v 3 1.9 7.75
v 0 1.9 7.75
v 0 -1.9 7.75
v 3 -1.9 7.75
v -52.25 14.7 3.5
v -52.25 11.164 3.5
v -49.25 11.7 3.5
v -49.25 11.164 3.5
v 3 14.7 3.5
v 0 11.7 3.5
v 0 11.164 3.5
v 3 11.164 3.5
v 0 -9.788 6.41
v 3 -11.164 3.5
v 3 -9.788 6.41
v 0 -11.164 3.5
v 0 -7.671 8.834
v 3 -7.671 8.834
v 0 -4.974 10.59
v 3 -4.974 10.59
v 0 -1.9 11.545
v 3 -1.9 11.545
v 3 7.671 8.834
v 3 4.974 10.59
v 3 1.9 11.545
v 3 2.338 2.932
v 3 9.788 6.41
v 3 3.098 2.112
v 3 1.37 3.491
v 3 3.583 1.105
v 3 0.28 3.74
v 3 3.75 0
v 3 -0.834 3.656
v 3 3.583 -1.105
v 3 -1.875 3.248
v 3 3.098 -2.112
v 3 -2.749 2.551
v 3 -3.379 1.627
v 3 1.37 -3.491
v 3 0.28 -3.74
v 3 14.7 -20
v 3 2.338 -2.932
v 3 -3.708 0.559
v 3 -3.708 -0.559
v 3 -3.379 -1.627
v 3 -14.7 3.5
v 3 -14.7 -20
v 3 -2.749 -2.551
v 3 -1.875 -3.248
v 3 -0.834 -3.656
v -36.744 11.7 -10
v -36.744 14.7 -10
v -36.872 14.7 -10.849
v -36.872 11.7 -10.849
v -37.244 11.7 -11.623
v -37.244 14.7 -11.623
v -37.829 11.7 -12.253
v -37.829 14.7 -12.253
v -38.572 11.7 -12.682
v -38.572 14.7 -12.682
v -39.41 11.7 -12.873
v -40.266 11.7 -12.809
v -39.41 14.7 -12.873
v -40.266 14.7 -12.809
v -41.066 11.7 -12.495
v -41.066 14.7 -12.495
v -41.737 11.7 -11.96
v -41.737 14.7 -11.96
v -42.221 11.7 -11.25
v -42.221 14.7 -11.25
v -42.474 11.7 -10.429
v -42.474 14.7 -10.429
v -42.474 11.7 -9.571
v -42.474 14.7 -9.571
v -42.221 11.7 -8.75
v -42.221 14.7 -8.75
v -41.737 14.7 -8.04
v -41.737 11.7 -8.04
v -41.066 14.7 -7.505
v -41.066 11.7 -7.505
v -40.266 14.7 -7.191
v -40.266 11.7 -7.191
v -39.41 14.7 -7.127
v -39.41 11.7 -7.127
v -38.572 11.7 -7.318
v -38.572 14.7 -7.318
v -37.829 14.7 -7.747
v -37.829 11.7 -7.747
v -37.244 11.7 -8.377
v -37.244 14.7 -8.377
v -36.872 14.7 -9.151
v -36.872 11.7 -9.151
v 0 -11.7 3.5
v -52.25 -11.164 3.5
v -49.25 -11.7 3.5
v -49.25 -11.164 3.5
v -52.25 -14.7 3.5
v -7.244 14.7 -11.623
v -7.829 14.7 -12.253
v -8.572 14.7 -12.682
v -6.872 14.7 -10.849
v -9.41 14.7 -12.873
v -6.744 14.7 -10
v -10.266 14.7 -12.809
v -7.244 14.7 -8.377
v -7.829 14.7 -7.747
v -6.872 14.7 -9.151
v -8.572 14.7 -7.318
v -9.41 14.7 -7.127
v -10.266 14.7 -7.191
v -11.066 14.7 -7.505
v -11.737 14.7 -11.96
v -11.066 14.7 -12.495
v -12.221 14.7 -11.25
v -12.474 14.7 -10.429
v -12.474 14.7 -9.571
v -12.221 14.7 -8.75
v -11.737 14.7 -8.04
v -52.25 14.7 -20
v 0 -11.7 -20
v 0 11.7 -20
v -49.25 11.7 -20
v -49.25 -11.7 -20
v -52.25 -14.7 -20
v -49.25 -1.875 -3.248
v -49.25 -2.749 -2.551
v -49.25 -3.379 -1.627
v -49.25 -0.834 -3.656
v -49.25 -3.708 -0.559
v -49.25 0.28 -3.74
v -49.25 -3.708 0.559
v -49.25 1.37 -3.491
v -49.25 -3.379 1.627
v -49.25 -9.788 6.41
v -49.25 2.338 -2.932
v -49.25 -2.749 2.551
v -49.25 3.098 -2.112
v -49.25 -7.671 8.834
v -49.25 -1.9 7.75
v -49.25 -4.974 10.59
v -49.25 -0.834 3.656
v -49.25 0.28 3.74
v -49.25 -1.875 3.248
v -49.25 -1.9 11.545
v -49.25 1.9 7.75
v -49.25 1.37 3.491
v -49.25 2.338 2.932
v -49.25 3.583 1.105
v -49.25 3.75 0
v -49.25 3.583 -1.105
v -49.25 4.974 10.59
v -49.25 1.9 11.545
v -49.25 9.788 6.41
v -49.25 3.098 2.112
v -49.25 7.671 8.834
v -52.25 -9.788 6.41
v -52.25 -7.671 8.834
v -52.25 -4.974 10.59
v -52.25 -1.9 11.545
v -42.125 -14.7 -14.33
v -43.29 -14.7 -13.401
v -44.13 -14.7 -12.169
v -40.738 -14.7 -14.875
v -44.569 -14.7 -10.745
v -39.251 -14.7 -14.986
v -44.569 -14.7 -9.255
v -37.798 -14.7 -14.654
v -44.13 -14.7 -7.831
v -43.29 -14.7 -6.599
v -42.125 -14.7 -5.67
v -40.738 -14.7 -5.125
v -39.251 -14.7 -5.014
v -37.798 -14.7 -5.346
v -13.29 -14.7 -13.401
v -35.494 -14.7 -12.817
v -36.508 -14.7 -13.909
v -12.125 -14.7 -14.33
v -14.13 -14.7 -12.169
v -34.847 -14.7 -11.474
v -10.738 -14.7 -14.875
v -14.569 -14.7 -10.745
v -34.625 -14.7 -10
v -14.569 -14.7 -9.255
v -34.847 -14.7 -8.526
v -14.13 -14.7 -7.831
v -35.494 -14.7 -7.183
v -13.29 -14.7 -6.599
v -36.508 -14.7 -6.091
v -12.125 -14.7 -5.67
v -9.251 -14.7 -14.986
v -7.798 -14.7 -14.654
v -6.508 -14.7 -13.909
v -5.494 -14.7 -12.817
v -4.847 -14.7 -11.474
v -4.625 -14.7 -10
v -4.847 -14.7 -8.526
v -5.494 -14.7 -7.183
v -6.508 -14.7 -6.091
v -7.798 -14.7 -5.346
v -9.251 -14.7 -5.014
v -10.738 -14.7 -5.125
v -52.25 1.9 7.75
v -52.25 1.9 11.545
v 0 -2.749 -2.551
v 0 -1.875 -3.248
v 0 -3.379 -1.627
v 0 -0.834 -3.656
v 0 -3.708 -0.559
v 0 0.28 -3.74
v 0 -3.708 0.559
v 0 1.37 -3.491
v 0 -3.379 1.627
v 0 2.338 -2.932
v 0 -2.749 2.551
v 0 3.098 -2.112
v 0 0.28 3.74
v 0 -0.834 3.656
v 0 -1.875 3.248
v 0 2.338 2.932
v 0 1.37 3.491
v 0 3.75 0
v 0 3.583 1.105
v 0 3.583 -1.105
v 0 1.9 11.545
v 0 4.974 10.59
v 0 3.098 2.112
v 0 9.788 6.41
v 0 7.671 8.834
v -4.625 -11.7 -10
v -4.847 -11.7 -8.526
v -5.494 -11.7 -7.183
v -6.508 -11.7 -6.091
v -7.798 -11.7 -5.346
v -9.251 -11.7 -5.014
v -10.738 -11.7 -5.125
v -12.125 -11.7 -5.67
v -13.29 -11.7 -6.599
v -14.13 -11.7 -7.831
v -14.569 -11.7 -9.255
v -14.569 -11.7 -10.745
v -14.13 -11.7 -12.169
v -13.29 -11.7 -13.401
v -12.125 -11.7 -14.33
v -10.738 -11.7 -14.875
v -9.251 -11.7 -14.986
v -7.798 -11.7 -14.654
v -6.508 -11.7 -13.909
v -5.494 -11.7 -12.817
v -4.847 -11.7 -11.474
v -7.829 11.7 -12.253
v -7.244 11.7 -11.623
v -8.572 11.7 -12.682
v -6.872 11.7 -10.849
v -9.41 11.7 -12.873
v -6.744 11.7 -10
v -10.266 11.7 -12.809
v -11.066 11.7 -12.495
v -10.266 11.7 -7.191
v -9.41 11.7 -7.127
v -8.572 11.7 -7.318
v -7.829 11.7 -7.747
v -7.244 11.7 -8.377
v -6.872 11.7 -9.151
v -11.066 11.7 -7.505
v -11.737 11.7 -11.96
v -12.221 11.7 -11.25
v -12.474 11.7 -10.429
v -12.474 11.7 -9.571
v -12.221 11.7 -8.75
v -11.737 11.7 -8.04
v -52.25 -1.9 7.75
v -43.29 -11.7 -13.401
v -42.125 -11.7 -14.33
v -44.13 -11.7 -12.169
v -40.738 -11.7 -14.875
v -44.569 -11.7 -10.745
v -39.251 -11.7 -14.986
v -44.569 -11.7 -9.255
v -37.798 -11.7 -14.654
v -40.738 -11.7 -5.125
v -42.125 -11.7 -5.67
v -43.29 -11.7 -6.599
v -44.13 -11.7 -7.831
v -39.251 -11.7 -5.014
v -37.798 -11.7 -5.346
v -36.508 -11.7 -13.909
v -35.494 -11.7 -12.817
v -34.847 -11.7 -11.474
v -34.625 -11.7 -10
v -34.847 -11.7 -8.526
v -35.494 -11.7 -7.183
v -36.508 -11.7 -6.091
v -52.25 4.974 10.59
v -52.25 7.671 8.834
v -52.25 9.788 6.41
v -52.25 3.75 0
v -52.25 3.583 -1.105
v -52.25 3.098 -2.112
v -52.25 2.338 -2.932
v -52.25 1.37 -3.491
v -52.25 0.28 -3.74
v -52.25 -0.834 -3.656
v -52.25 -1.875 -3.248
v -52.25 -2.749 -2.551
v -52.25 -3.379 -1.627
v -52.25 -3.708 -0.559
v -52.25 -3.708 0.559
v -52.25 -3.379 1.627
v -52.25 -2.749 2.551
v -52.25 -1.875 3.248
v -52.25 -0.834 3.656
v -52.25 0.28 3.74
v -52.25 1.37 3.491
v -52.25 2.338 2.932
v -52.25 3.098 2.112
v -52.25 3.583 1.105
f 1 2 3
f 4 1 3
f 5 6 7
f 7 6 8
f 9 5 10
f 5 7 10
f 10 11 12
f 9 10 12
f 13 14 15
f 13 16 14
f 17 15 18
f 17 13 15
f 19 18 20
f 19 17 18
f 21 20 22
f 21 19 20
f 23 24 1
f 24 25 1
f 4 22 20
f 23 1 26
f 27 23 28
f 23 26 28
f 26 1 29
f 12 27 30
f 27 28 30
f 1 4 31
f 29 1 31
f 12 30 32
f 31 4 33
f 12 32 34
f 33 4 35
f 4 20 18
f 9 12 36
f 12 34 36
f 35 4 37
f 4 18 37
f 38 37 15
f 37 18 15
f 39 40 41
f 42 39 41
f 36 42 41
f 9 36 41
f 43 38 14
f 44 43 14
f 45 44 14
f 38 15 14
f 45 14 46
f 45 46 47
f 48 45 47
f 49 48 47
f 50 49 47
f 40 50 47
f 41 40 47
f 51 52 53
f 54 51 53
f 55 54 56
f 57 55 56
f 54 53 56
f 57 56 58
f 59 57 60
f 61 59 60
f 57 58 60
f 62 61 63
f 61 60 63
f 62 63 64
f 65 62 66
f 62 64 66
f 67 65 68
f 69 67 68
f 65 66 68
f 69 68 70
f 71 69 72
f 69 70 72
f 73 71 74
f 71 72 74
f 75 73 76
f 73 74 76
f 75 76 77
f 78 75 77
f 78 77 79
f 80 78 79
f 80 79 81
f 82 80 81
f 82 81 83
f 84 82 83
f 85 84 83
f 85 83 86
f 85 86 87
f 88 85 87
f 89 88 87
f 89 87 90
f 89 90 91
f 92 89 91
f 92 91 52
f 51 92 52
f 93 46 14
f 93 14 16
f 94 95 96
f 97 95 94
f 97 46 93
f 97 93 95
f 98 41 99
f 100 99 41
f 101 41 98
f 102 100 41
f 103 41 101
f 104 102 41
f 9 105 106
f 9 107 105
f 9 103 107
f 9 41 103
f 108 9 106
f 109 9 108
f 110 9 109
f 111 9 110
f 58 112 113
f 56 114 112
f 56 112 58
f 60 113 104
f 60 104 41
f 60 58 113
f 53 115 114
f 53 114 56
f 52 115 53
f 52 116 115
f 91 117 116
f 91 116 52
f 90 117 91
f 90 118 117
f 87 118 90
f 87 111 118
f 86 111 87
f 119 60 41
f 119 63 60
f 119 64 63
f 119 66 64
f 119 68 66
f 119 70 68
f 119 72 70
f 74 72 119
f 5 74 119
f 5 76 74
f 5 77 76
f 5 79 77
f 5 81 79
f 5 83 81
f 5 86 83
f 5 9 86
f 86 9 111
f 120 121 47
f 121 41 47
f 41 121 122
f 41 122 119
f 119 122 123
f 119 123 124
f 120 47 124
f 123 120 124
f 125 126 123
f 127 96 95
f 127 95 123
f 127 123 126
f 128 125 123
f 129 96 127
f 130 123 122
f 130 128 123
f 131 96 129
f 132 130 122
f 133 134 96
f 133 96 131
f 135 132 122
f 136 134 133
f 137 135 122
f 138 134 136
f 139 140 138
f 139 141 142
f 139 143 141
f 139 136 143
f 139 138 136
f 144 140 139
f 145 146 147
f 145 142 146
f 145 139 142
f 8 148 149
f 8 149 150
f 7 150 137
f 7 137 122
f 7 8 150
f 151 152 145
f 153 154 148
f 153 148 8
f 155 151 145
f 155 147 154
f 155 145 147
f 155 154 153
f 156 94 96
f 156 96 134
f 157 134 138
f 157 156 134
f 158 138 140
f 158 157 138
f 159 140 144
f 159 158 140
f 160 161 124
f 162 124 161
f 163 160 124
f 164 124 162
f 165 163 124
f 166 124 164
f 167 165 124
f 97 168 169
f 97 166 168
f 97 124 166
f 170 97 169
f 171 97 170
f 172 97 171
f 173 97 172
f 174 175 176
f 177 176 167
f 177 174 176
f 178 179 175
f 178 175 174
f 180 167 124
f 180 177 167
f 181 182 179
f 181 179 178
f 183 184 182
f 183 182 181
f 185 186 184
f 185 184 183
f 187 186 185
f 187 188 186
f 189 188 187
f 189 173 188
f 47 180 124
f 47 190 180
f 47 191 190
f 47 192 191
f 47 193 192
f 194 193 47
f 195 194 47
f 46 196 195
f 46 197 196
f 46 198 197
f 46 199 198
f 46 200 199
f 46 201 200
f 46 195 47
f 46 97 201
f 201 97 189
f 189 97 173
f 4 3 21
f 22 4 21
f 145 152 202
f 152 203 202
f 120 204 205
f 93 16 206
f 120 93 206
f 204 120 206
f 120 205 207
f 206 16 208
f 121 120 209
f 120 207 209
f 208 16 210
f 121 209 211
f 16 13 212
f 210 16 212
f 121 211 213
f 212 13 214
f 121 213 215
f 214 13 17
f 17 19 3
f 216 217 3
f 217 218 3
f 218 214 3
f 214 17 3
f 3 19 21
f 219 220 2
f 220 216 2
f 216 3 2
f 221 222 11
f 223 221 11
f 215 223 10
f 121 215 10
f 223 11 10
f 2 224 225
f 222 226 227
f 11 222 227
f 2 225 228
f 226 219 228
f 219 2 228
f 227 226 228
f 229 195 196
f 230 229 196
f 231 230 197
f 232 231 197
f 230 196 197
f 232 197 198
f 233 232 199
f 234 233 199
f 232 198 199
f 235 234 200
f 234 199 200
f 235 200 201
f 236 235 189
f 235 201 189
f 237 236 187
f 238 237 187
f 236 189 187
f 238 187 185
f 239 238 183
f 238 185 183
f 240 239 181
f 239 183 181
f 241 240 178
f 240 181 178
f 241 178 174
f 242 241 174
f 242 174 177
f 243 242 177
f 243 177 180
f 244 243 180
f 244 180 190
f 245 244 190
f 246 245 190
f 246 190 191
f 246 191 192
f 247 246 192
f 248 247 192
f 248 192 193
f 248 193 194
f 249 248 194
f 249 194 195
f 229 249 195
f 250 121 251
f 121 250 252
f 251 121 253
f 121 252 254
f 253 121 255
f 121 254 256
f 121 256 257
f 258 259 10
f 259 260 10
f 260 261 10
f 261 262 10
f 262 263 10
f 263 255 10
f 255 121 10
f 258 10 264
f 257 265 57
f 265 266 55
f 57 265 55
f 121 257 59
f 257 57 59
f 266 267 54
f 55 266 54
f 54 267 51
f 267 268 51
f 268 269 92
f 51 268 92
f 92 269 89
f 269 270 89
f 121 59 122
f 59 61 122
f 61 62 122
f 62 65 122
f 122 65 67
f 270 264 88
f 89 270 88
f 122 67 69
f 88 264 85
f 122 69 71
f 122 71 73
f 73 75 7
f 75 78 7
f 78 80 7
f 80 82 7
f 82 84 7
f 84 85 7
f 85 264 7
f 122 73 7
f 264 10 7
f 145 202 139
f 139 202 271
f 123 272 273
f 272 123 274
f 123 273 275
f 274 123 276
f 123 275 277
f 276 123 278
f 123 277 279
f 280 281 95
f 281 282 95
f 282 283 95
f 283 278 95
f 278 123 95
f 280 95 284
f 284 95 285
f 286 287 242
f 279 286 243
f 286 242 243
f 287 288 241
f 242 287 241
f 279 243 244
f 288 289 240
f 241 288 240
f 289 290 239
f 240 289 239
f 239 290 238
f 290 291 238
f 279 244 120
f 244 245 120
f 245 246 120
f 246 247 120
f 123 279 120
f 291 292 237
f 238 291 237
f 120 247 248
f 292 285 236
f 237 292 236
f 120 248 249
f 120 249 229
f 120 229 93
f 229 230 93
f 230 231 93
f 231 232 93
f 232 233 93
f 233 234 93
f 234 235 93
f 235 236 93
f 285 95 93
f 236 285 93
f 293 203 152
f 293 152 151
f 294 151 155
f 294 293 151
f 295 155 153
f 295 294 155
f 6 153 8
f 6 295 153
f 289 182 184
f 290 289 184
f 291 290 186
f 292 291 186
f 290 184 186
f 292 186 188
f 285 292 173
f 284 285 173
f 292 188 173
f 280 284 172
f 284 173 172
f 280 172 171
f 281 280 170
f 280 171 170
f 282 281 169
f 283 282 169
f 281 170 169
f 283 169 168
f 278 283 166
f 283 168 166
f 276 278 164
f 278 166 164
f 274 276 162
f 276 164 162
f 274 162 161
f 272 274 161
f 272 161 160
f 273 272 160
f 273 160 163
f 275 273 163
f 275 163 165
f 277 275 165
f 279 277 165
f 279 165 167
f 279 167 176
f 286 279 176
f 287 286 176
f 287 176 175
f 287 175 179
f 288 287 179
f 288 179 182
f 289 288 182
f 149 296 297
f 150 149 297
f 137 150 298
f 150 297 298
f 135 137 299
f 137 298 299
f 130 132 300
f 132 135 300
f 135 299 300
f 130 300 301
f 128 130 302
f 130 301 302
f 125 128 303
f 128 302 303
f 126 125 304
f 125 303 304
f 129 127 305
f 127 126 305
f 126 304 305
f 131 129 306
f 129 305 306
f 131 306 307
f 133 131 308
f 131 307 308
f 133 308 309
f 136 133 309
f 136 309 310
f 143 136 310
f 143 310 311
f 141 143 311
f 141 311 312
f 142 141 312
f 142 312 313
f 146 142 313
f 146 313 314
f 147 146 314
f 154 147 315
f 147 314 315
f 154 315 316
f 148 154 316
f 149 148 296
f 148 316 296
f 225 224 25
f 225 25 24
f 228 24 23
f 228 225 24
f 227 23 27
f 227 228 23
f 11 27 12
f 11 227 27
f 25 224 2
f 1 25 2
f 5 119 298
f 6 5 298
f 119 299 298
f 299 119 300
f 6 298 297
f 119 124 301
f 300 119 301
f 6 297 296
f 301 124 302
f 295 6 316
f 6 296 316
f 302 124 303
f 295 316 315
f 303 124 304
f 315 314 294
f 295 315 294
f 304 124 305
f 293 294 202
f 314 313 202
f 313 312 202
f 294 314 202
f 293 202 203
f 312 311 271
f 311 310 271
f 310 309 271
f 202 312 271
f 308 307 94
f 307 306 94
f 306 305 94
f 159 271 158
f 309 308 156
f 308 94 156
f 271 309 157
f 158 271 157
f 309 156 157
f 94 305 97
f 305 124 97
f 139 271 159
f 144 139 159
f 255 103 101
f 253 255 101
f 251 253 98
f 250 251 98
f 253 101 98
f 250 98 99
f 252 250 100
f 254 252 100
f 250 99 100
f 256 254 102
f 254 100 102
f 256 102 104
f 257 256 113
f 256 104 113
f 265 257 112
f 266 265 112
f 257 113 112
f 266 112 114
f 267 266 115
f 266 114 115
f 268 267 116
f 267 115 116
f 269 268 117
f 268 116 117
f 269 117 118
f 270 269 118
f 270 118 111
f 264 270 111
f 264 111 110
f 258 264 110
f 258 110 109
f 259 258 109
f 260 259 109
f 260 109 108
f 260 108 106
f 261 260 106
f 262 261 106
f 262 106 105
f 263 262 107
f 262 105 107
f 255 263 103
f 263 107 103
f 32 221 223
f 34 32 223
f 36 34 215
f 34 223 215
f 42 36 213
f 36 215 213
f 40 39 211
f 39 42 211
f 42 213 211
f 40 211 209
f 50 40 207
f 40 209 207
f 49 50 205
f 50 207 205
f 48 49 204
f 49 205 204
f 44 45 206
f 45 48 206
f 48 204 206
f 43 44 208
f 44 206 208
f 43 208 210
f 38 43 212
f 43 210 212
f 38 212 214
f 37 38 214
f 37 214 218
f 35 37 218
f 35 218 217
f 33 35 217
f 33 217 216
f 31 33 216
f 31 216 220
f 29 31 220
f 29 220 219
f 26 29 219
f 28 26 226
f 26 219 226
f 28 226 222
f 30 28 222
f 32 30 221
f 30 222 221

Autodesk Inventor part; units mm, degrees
ref_plane "YZ Plane" through (0, 0, 0) normal (1, 0, 0) x (0, 1, 0)
ref_plane "XZ Plane" through (0, 0, 0) normal (0, 1, 0) x (-1, 0, 0)
ref_plane "XY Plane" through (0, 0, 0) normal (0, 0, 1) x (1, 0, 0)
sketch "Sketch1" plane through (0, 0, 0) normal (1, 0, 0) x (0, 1, 0)
  arc A0 (-1.9, 11.5447) -> (-11.7, 0) centre (0, 0) ccw
  line L0 (1.9, 11.5447) -> (1.9, 7.75)
  line L1 (1.9, 7.75) -> (-1.9, 7.75)
  line L2 (-1.9, 7.75) -> (-1.9, 11.5447)
  line L3 (0, 7.75) -> (0, 0) construction
  arc A1 (1.9, 11.5447) -> (-1.9, 11.5447) centre (0, 0) ccw construction
  circle A2 centre (0, 0) radius 3.75
  line L4 (11.7, 0) -> (11.7, -20)
  line L5 (11.7, -20) -> (-11.7, -20)
  line L6 (-11.7, -20) -> (-11.7, 0)
  arc A3 (11.7, 0) -> (1.9, 11.5447) centre (0, 0) ccw
  arc A4 (-11.7, 0) -> (11.7, 0) centre (0, 0) ccw construction
  dimension "d0" = 23.4
  dimension "d1" = 3.8
  dimension "d2" = 7.75
  dimension "d3" = 7.5
  dimension "d9" = 20
extrude "Extrusion1" add sketch "Sketch1" along normal blind 3
pattern_linear "Rectangular Pattern1" count 2 spacing 52.25 along (-1, 0, 0) of "Extrusion1"
sketch "Sketch3" plane through (0, -11.7, -20) normal (0, -1, 0) x (1, 0, 0)
  line L0 (-52.25, 0) -> (-49.25, 0) projected
  line L1 (-52.25, 0) -> (3, 0)
  line L2 (3, 0) -> (3, 23.5)
  line L3 (3, 23.5) -> (-52.25, 23.5)
  line L4 (-52.25, 23.5) -> (-52.25, 0)
  point P0 (0, 20)
  dimension "d12" = 3.5
extrude "Extrusion3" add sketch "Sketch3" along normal blind 3
sketch "Sketch4" plane through (0, -11.7, -20) normal (0, 1, 0) x (1, 0, 0)
  line L0 (-49.25, -31.5447) -> (-49.25, -20) construction
  line L1 (-49.25, -20) -> (-52.25, -20)
  line L2 (-52.25, -20) -> (-52.25, -23.5)
  line L3 (-52.25, -23.5) -> (-49.25, -23.5)
  line L4 (-49.25, -23.5) -> (-49.25, -20)
  line L5 (0, -20) -> (0, 0) construction
  line L6 (3, -23.5) -> (-52.25, -23.5) construction
  line L7 (0, -20) -> (3, -20)
  line L8 (3, -20) -> (3, -23.5)
  line L9 (3, -23.5) -> (0, -23.5)
  line L10 (0, -23.5) -> (0, -20)
extrude "Extrusion4" add sketch "Sketch4" along normal up to surface
mirror "Mirror1" about plane through (0, 0, 0) normal (0, 1, 0) of "Extrusion3", "Extrusion4"
sketch "Sketch9" plane through (-52.25, 14.7, -20) normal (0, 1, 0) x (1, 0, 0)
  circle A0 centre (12.625, -10) radius 2.8813
  circle A1 centre (42.625, -10) radius 2.8813
  line L0 (12.625, -10) -> (42.625, -10) construction
  line L1 (27.625, -10) -> (27.625, 0) construction
  line L2 (3, 0) -> (52.25, 0) construction
  point P0 (52.25, -20)
  dimension "d30" = 5.7625
  dimension "d31" = 30
  dimension "d32" = 10
extrude "Extrusion9" cut sketch "Sketch9" against normal up to surface (3 mm away)
sketch "Sketch10" plane through (0, -14.7, -20) normal (0, -1, 0) x (1, 0, 0)
  circle A0 centre (-9.625, 10) radius 5
  circle A1 centre (-39.625, 10) radius 5
  circle A2 centre (-39.625, 10) radius 2.8813 construction
  circle A3 centre (-9.625, 10) radius 2.8813 construction
  point P0 (0, 20)
  dimension "d35" = 10
extrude "Extrusion10" cut sketch "Sketch10" against normal up to surface (3 mm away)
properties part number "Xgantry_CableChain_bottom_connector"
